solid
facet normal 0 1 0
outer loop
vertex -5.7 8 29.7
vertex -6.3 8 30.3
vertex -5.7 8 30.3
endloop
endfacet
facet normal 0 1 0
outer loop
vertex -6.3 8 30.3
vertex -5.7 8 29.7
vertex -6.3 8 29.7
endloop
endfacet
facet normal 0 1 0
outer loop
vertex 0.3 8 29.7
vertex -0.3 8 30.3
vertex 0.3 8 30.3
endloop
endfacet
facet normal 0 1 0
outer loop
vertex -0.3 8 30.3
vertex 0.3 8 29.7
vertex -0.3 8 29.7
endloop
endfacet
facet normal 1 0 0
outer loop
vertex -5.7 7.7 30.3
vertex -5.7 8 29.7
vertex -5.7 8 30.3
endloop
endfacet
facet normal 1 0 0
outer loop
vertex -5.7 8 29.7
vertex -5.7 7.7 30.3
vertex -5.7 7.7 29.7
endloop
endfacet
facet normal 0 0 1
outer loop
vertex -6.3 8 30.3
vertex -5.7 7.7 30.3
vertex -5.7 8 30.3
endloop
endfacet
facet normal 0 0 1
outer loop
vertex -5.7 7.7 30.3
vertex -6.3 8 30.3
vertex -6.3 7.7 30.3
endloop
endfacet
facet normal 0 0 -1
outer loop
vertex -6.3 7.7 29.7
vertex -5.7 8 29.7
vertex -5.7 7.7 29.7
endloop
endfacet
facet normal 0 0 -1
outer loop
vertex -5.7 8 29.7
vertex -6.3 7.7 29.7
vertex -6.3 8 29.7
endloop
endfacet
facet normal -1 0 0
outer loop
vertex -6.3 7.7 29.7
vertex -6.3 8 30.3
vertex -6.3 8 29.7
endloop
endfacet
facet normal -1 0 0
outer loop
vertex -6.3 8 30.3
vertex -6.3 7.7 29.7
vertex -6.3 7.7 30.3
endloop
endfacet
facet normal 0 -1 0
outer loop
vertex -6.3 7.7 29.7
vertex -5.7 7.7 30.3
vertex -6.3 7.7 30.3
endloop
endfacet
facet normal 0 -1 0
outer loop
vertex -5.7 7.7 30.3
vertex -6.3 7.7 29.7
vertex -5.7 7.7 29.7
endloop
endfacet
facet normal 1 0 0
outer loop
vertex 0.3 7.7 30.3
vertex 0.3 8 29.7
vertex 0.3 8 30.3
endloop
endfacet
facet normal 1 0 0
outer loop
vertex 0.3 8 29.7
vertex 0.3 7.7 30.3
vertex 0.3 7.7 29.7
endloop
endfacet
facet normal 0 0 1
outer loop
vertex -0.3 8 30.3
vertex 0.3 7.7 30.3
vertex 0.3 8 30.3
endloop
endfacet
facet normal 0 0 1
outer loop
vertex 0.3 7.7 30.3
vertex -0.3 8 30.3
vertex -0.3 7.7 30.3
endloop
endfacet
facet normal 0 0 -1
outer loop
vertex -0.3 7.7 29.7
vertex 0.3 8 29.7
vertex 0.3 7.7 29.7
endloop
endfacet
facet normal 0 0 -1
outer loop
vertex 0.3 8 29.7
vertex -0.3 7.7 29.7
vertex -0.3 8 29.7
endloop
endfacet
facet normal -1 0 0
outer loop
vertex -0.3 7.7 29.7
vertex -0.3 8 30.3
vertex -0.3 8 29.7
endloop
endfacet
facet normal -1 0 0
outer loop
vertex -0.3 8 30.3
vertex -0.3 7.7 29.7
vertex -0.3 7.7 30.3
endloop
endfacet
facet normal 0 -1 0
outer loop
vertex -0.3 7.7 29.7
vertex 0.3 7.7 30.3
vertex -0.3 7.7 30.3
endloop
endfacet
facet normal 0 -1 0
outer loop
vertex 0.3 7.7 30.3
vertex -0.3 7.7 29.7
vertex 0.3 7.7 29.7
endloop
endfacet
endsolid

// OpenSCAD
// The payload-face arrow must point UP (+Z): beside the stem (below centre)
// there is face material. A down-arrow (its head would be here) or a plain
// rectangle cuts it away. Must render non-empty.
include <../stage.scad>
intersection() {
    stage_z_slider();
    for (p = [[-3, -5], [3, -5]])
        translate([xs_xc + p[0] - 0.3, payload_face_y - 0.3, stage_payload_z + p[1] - 0.3]) cube([0.6, 0.31, 0.6]);
}
